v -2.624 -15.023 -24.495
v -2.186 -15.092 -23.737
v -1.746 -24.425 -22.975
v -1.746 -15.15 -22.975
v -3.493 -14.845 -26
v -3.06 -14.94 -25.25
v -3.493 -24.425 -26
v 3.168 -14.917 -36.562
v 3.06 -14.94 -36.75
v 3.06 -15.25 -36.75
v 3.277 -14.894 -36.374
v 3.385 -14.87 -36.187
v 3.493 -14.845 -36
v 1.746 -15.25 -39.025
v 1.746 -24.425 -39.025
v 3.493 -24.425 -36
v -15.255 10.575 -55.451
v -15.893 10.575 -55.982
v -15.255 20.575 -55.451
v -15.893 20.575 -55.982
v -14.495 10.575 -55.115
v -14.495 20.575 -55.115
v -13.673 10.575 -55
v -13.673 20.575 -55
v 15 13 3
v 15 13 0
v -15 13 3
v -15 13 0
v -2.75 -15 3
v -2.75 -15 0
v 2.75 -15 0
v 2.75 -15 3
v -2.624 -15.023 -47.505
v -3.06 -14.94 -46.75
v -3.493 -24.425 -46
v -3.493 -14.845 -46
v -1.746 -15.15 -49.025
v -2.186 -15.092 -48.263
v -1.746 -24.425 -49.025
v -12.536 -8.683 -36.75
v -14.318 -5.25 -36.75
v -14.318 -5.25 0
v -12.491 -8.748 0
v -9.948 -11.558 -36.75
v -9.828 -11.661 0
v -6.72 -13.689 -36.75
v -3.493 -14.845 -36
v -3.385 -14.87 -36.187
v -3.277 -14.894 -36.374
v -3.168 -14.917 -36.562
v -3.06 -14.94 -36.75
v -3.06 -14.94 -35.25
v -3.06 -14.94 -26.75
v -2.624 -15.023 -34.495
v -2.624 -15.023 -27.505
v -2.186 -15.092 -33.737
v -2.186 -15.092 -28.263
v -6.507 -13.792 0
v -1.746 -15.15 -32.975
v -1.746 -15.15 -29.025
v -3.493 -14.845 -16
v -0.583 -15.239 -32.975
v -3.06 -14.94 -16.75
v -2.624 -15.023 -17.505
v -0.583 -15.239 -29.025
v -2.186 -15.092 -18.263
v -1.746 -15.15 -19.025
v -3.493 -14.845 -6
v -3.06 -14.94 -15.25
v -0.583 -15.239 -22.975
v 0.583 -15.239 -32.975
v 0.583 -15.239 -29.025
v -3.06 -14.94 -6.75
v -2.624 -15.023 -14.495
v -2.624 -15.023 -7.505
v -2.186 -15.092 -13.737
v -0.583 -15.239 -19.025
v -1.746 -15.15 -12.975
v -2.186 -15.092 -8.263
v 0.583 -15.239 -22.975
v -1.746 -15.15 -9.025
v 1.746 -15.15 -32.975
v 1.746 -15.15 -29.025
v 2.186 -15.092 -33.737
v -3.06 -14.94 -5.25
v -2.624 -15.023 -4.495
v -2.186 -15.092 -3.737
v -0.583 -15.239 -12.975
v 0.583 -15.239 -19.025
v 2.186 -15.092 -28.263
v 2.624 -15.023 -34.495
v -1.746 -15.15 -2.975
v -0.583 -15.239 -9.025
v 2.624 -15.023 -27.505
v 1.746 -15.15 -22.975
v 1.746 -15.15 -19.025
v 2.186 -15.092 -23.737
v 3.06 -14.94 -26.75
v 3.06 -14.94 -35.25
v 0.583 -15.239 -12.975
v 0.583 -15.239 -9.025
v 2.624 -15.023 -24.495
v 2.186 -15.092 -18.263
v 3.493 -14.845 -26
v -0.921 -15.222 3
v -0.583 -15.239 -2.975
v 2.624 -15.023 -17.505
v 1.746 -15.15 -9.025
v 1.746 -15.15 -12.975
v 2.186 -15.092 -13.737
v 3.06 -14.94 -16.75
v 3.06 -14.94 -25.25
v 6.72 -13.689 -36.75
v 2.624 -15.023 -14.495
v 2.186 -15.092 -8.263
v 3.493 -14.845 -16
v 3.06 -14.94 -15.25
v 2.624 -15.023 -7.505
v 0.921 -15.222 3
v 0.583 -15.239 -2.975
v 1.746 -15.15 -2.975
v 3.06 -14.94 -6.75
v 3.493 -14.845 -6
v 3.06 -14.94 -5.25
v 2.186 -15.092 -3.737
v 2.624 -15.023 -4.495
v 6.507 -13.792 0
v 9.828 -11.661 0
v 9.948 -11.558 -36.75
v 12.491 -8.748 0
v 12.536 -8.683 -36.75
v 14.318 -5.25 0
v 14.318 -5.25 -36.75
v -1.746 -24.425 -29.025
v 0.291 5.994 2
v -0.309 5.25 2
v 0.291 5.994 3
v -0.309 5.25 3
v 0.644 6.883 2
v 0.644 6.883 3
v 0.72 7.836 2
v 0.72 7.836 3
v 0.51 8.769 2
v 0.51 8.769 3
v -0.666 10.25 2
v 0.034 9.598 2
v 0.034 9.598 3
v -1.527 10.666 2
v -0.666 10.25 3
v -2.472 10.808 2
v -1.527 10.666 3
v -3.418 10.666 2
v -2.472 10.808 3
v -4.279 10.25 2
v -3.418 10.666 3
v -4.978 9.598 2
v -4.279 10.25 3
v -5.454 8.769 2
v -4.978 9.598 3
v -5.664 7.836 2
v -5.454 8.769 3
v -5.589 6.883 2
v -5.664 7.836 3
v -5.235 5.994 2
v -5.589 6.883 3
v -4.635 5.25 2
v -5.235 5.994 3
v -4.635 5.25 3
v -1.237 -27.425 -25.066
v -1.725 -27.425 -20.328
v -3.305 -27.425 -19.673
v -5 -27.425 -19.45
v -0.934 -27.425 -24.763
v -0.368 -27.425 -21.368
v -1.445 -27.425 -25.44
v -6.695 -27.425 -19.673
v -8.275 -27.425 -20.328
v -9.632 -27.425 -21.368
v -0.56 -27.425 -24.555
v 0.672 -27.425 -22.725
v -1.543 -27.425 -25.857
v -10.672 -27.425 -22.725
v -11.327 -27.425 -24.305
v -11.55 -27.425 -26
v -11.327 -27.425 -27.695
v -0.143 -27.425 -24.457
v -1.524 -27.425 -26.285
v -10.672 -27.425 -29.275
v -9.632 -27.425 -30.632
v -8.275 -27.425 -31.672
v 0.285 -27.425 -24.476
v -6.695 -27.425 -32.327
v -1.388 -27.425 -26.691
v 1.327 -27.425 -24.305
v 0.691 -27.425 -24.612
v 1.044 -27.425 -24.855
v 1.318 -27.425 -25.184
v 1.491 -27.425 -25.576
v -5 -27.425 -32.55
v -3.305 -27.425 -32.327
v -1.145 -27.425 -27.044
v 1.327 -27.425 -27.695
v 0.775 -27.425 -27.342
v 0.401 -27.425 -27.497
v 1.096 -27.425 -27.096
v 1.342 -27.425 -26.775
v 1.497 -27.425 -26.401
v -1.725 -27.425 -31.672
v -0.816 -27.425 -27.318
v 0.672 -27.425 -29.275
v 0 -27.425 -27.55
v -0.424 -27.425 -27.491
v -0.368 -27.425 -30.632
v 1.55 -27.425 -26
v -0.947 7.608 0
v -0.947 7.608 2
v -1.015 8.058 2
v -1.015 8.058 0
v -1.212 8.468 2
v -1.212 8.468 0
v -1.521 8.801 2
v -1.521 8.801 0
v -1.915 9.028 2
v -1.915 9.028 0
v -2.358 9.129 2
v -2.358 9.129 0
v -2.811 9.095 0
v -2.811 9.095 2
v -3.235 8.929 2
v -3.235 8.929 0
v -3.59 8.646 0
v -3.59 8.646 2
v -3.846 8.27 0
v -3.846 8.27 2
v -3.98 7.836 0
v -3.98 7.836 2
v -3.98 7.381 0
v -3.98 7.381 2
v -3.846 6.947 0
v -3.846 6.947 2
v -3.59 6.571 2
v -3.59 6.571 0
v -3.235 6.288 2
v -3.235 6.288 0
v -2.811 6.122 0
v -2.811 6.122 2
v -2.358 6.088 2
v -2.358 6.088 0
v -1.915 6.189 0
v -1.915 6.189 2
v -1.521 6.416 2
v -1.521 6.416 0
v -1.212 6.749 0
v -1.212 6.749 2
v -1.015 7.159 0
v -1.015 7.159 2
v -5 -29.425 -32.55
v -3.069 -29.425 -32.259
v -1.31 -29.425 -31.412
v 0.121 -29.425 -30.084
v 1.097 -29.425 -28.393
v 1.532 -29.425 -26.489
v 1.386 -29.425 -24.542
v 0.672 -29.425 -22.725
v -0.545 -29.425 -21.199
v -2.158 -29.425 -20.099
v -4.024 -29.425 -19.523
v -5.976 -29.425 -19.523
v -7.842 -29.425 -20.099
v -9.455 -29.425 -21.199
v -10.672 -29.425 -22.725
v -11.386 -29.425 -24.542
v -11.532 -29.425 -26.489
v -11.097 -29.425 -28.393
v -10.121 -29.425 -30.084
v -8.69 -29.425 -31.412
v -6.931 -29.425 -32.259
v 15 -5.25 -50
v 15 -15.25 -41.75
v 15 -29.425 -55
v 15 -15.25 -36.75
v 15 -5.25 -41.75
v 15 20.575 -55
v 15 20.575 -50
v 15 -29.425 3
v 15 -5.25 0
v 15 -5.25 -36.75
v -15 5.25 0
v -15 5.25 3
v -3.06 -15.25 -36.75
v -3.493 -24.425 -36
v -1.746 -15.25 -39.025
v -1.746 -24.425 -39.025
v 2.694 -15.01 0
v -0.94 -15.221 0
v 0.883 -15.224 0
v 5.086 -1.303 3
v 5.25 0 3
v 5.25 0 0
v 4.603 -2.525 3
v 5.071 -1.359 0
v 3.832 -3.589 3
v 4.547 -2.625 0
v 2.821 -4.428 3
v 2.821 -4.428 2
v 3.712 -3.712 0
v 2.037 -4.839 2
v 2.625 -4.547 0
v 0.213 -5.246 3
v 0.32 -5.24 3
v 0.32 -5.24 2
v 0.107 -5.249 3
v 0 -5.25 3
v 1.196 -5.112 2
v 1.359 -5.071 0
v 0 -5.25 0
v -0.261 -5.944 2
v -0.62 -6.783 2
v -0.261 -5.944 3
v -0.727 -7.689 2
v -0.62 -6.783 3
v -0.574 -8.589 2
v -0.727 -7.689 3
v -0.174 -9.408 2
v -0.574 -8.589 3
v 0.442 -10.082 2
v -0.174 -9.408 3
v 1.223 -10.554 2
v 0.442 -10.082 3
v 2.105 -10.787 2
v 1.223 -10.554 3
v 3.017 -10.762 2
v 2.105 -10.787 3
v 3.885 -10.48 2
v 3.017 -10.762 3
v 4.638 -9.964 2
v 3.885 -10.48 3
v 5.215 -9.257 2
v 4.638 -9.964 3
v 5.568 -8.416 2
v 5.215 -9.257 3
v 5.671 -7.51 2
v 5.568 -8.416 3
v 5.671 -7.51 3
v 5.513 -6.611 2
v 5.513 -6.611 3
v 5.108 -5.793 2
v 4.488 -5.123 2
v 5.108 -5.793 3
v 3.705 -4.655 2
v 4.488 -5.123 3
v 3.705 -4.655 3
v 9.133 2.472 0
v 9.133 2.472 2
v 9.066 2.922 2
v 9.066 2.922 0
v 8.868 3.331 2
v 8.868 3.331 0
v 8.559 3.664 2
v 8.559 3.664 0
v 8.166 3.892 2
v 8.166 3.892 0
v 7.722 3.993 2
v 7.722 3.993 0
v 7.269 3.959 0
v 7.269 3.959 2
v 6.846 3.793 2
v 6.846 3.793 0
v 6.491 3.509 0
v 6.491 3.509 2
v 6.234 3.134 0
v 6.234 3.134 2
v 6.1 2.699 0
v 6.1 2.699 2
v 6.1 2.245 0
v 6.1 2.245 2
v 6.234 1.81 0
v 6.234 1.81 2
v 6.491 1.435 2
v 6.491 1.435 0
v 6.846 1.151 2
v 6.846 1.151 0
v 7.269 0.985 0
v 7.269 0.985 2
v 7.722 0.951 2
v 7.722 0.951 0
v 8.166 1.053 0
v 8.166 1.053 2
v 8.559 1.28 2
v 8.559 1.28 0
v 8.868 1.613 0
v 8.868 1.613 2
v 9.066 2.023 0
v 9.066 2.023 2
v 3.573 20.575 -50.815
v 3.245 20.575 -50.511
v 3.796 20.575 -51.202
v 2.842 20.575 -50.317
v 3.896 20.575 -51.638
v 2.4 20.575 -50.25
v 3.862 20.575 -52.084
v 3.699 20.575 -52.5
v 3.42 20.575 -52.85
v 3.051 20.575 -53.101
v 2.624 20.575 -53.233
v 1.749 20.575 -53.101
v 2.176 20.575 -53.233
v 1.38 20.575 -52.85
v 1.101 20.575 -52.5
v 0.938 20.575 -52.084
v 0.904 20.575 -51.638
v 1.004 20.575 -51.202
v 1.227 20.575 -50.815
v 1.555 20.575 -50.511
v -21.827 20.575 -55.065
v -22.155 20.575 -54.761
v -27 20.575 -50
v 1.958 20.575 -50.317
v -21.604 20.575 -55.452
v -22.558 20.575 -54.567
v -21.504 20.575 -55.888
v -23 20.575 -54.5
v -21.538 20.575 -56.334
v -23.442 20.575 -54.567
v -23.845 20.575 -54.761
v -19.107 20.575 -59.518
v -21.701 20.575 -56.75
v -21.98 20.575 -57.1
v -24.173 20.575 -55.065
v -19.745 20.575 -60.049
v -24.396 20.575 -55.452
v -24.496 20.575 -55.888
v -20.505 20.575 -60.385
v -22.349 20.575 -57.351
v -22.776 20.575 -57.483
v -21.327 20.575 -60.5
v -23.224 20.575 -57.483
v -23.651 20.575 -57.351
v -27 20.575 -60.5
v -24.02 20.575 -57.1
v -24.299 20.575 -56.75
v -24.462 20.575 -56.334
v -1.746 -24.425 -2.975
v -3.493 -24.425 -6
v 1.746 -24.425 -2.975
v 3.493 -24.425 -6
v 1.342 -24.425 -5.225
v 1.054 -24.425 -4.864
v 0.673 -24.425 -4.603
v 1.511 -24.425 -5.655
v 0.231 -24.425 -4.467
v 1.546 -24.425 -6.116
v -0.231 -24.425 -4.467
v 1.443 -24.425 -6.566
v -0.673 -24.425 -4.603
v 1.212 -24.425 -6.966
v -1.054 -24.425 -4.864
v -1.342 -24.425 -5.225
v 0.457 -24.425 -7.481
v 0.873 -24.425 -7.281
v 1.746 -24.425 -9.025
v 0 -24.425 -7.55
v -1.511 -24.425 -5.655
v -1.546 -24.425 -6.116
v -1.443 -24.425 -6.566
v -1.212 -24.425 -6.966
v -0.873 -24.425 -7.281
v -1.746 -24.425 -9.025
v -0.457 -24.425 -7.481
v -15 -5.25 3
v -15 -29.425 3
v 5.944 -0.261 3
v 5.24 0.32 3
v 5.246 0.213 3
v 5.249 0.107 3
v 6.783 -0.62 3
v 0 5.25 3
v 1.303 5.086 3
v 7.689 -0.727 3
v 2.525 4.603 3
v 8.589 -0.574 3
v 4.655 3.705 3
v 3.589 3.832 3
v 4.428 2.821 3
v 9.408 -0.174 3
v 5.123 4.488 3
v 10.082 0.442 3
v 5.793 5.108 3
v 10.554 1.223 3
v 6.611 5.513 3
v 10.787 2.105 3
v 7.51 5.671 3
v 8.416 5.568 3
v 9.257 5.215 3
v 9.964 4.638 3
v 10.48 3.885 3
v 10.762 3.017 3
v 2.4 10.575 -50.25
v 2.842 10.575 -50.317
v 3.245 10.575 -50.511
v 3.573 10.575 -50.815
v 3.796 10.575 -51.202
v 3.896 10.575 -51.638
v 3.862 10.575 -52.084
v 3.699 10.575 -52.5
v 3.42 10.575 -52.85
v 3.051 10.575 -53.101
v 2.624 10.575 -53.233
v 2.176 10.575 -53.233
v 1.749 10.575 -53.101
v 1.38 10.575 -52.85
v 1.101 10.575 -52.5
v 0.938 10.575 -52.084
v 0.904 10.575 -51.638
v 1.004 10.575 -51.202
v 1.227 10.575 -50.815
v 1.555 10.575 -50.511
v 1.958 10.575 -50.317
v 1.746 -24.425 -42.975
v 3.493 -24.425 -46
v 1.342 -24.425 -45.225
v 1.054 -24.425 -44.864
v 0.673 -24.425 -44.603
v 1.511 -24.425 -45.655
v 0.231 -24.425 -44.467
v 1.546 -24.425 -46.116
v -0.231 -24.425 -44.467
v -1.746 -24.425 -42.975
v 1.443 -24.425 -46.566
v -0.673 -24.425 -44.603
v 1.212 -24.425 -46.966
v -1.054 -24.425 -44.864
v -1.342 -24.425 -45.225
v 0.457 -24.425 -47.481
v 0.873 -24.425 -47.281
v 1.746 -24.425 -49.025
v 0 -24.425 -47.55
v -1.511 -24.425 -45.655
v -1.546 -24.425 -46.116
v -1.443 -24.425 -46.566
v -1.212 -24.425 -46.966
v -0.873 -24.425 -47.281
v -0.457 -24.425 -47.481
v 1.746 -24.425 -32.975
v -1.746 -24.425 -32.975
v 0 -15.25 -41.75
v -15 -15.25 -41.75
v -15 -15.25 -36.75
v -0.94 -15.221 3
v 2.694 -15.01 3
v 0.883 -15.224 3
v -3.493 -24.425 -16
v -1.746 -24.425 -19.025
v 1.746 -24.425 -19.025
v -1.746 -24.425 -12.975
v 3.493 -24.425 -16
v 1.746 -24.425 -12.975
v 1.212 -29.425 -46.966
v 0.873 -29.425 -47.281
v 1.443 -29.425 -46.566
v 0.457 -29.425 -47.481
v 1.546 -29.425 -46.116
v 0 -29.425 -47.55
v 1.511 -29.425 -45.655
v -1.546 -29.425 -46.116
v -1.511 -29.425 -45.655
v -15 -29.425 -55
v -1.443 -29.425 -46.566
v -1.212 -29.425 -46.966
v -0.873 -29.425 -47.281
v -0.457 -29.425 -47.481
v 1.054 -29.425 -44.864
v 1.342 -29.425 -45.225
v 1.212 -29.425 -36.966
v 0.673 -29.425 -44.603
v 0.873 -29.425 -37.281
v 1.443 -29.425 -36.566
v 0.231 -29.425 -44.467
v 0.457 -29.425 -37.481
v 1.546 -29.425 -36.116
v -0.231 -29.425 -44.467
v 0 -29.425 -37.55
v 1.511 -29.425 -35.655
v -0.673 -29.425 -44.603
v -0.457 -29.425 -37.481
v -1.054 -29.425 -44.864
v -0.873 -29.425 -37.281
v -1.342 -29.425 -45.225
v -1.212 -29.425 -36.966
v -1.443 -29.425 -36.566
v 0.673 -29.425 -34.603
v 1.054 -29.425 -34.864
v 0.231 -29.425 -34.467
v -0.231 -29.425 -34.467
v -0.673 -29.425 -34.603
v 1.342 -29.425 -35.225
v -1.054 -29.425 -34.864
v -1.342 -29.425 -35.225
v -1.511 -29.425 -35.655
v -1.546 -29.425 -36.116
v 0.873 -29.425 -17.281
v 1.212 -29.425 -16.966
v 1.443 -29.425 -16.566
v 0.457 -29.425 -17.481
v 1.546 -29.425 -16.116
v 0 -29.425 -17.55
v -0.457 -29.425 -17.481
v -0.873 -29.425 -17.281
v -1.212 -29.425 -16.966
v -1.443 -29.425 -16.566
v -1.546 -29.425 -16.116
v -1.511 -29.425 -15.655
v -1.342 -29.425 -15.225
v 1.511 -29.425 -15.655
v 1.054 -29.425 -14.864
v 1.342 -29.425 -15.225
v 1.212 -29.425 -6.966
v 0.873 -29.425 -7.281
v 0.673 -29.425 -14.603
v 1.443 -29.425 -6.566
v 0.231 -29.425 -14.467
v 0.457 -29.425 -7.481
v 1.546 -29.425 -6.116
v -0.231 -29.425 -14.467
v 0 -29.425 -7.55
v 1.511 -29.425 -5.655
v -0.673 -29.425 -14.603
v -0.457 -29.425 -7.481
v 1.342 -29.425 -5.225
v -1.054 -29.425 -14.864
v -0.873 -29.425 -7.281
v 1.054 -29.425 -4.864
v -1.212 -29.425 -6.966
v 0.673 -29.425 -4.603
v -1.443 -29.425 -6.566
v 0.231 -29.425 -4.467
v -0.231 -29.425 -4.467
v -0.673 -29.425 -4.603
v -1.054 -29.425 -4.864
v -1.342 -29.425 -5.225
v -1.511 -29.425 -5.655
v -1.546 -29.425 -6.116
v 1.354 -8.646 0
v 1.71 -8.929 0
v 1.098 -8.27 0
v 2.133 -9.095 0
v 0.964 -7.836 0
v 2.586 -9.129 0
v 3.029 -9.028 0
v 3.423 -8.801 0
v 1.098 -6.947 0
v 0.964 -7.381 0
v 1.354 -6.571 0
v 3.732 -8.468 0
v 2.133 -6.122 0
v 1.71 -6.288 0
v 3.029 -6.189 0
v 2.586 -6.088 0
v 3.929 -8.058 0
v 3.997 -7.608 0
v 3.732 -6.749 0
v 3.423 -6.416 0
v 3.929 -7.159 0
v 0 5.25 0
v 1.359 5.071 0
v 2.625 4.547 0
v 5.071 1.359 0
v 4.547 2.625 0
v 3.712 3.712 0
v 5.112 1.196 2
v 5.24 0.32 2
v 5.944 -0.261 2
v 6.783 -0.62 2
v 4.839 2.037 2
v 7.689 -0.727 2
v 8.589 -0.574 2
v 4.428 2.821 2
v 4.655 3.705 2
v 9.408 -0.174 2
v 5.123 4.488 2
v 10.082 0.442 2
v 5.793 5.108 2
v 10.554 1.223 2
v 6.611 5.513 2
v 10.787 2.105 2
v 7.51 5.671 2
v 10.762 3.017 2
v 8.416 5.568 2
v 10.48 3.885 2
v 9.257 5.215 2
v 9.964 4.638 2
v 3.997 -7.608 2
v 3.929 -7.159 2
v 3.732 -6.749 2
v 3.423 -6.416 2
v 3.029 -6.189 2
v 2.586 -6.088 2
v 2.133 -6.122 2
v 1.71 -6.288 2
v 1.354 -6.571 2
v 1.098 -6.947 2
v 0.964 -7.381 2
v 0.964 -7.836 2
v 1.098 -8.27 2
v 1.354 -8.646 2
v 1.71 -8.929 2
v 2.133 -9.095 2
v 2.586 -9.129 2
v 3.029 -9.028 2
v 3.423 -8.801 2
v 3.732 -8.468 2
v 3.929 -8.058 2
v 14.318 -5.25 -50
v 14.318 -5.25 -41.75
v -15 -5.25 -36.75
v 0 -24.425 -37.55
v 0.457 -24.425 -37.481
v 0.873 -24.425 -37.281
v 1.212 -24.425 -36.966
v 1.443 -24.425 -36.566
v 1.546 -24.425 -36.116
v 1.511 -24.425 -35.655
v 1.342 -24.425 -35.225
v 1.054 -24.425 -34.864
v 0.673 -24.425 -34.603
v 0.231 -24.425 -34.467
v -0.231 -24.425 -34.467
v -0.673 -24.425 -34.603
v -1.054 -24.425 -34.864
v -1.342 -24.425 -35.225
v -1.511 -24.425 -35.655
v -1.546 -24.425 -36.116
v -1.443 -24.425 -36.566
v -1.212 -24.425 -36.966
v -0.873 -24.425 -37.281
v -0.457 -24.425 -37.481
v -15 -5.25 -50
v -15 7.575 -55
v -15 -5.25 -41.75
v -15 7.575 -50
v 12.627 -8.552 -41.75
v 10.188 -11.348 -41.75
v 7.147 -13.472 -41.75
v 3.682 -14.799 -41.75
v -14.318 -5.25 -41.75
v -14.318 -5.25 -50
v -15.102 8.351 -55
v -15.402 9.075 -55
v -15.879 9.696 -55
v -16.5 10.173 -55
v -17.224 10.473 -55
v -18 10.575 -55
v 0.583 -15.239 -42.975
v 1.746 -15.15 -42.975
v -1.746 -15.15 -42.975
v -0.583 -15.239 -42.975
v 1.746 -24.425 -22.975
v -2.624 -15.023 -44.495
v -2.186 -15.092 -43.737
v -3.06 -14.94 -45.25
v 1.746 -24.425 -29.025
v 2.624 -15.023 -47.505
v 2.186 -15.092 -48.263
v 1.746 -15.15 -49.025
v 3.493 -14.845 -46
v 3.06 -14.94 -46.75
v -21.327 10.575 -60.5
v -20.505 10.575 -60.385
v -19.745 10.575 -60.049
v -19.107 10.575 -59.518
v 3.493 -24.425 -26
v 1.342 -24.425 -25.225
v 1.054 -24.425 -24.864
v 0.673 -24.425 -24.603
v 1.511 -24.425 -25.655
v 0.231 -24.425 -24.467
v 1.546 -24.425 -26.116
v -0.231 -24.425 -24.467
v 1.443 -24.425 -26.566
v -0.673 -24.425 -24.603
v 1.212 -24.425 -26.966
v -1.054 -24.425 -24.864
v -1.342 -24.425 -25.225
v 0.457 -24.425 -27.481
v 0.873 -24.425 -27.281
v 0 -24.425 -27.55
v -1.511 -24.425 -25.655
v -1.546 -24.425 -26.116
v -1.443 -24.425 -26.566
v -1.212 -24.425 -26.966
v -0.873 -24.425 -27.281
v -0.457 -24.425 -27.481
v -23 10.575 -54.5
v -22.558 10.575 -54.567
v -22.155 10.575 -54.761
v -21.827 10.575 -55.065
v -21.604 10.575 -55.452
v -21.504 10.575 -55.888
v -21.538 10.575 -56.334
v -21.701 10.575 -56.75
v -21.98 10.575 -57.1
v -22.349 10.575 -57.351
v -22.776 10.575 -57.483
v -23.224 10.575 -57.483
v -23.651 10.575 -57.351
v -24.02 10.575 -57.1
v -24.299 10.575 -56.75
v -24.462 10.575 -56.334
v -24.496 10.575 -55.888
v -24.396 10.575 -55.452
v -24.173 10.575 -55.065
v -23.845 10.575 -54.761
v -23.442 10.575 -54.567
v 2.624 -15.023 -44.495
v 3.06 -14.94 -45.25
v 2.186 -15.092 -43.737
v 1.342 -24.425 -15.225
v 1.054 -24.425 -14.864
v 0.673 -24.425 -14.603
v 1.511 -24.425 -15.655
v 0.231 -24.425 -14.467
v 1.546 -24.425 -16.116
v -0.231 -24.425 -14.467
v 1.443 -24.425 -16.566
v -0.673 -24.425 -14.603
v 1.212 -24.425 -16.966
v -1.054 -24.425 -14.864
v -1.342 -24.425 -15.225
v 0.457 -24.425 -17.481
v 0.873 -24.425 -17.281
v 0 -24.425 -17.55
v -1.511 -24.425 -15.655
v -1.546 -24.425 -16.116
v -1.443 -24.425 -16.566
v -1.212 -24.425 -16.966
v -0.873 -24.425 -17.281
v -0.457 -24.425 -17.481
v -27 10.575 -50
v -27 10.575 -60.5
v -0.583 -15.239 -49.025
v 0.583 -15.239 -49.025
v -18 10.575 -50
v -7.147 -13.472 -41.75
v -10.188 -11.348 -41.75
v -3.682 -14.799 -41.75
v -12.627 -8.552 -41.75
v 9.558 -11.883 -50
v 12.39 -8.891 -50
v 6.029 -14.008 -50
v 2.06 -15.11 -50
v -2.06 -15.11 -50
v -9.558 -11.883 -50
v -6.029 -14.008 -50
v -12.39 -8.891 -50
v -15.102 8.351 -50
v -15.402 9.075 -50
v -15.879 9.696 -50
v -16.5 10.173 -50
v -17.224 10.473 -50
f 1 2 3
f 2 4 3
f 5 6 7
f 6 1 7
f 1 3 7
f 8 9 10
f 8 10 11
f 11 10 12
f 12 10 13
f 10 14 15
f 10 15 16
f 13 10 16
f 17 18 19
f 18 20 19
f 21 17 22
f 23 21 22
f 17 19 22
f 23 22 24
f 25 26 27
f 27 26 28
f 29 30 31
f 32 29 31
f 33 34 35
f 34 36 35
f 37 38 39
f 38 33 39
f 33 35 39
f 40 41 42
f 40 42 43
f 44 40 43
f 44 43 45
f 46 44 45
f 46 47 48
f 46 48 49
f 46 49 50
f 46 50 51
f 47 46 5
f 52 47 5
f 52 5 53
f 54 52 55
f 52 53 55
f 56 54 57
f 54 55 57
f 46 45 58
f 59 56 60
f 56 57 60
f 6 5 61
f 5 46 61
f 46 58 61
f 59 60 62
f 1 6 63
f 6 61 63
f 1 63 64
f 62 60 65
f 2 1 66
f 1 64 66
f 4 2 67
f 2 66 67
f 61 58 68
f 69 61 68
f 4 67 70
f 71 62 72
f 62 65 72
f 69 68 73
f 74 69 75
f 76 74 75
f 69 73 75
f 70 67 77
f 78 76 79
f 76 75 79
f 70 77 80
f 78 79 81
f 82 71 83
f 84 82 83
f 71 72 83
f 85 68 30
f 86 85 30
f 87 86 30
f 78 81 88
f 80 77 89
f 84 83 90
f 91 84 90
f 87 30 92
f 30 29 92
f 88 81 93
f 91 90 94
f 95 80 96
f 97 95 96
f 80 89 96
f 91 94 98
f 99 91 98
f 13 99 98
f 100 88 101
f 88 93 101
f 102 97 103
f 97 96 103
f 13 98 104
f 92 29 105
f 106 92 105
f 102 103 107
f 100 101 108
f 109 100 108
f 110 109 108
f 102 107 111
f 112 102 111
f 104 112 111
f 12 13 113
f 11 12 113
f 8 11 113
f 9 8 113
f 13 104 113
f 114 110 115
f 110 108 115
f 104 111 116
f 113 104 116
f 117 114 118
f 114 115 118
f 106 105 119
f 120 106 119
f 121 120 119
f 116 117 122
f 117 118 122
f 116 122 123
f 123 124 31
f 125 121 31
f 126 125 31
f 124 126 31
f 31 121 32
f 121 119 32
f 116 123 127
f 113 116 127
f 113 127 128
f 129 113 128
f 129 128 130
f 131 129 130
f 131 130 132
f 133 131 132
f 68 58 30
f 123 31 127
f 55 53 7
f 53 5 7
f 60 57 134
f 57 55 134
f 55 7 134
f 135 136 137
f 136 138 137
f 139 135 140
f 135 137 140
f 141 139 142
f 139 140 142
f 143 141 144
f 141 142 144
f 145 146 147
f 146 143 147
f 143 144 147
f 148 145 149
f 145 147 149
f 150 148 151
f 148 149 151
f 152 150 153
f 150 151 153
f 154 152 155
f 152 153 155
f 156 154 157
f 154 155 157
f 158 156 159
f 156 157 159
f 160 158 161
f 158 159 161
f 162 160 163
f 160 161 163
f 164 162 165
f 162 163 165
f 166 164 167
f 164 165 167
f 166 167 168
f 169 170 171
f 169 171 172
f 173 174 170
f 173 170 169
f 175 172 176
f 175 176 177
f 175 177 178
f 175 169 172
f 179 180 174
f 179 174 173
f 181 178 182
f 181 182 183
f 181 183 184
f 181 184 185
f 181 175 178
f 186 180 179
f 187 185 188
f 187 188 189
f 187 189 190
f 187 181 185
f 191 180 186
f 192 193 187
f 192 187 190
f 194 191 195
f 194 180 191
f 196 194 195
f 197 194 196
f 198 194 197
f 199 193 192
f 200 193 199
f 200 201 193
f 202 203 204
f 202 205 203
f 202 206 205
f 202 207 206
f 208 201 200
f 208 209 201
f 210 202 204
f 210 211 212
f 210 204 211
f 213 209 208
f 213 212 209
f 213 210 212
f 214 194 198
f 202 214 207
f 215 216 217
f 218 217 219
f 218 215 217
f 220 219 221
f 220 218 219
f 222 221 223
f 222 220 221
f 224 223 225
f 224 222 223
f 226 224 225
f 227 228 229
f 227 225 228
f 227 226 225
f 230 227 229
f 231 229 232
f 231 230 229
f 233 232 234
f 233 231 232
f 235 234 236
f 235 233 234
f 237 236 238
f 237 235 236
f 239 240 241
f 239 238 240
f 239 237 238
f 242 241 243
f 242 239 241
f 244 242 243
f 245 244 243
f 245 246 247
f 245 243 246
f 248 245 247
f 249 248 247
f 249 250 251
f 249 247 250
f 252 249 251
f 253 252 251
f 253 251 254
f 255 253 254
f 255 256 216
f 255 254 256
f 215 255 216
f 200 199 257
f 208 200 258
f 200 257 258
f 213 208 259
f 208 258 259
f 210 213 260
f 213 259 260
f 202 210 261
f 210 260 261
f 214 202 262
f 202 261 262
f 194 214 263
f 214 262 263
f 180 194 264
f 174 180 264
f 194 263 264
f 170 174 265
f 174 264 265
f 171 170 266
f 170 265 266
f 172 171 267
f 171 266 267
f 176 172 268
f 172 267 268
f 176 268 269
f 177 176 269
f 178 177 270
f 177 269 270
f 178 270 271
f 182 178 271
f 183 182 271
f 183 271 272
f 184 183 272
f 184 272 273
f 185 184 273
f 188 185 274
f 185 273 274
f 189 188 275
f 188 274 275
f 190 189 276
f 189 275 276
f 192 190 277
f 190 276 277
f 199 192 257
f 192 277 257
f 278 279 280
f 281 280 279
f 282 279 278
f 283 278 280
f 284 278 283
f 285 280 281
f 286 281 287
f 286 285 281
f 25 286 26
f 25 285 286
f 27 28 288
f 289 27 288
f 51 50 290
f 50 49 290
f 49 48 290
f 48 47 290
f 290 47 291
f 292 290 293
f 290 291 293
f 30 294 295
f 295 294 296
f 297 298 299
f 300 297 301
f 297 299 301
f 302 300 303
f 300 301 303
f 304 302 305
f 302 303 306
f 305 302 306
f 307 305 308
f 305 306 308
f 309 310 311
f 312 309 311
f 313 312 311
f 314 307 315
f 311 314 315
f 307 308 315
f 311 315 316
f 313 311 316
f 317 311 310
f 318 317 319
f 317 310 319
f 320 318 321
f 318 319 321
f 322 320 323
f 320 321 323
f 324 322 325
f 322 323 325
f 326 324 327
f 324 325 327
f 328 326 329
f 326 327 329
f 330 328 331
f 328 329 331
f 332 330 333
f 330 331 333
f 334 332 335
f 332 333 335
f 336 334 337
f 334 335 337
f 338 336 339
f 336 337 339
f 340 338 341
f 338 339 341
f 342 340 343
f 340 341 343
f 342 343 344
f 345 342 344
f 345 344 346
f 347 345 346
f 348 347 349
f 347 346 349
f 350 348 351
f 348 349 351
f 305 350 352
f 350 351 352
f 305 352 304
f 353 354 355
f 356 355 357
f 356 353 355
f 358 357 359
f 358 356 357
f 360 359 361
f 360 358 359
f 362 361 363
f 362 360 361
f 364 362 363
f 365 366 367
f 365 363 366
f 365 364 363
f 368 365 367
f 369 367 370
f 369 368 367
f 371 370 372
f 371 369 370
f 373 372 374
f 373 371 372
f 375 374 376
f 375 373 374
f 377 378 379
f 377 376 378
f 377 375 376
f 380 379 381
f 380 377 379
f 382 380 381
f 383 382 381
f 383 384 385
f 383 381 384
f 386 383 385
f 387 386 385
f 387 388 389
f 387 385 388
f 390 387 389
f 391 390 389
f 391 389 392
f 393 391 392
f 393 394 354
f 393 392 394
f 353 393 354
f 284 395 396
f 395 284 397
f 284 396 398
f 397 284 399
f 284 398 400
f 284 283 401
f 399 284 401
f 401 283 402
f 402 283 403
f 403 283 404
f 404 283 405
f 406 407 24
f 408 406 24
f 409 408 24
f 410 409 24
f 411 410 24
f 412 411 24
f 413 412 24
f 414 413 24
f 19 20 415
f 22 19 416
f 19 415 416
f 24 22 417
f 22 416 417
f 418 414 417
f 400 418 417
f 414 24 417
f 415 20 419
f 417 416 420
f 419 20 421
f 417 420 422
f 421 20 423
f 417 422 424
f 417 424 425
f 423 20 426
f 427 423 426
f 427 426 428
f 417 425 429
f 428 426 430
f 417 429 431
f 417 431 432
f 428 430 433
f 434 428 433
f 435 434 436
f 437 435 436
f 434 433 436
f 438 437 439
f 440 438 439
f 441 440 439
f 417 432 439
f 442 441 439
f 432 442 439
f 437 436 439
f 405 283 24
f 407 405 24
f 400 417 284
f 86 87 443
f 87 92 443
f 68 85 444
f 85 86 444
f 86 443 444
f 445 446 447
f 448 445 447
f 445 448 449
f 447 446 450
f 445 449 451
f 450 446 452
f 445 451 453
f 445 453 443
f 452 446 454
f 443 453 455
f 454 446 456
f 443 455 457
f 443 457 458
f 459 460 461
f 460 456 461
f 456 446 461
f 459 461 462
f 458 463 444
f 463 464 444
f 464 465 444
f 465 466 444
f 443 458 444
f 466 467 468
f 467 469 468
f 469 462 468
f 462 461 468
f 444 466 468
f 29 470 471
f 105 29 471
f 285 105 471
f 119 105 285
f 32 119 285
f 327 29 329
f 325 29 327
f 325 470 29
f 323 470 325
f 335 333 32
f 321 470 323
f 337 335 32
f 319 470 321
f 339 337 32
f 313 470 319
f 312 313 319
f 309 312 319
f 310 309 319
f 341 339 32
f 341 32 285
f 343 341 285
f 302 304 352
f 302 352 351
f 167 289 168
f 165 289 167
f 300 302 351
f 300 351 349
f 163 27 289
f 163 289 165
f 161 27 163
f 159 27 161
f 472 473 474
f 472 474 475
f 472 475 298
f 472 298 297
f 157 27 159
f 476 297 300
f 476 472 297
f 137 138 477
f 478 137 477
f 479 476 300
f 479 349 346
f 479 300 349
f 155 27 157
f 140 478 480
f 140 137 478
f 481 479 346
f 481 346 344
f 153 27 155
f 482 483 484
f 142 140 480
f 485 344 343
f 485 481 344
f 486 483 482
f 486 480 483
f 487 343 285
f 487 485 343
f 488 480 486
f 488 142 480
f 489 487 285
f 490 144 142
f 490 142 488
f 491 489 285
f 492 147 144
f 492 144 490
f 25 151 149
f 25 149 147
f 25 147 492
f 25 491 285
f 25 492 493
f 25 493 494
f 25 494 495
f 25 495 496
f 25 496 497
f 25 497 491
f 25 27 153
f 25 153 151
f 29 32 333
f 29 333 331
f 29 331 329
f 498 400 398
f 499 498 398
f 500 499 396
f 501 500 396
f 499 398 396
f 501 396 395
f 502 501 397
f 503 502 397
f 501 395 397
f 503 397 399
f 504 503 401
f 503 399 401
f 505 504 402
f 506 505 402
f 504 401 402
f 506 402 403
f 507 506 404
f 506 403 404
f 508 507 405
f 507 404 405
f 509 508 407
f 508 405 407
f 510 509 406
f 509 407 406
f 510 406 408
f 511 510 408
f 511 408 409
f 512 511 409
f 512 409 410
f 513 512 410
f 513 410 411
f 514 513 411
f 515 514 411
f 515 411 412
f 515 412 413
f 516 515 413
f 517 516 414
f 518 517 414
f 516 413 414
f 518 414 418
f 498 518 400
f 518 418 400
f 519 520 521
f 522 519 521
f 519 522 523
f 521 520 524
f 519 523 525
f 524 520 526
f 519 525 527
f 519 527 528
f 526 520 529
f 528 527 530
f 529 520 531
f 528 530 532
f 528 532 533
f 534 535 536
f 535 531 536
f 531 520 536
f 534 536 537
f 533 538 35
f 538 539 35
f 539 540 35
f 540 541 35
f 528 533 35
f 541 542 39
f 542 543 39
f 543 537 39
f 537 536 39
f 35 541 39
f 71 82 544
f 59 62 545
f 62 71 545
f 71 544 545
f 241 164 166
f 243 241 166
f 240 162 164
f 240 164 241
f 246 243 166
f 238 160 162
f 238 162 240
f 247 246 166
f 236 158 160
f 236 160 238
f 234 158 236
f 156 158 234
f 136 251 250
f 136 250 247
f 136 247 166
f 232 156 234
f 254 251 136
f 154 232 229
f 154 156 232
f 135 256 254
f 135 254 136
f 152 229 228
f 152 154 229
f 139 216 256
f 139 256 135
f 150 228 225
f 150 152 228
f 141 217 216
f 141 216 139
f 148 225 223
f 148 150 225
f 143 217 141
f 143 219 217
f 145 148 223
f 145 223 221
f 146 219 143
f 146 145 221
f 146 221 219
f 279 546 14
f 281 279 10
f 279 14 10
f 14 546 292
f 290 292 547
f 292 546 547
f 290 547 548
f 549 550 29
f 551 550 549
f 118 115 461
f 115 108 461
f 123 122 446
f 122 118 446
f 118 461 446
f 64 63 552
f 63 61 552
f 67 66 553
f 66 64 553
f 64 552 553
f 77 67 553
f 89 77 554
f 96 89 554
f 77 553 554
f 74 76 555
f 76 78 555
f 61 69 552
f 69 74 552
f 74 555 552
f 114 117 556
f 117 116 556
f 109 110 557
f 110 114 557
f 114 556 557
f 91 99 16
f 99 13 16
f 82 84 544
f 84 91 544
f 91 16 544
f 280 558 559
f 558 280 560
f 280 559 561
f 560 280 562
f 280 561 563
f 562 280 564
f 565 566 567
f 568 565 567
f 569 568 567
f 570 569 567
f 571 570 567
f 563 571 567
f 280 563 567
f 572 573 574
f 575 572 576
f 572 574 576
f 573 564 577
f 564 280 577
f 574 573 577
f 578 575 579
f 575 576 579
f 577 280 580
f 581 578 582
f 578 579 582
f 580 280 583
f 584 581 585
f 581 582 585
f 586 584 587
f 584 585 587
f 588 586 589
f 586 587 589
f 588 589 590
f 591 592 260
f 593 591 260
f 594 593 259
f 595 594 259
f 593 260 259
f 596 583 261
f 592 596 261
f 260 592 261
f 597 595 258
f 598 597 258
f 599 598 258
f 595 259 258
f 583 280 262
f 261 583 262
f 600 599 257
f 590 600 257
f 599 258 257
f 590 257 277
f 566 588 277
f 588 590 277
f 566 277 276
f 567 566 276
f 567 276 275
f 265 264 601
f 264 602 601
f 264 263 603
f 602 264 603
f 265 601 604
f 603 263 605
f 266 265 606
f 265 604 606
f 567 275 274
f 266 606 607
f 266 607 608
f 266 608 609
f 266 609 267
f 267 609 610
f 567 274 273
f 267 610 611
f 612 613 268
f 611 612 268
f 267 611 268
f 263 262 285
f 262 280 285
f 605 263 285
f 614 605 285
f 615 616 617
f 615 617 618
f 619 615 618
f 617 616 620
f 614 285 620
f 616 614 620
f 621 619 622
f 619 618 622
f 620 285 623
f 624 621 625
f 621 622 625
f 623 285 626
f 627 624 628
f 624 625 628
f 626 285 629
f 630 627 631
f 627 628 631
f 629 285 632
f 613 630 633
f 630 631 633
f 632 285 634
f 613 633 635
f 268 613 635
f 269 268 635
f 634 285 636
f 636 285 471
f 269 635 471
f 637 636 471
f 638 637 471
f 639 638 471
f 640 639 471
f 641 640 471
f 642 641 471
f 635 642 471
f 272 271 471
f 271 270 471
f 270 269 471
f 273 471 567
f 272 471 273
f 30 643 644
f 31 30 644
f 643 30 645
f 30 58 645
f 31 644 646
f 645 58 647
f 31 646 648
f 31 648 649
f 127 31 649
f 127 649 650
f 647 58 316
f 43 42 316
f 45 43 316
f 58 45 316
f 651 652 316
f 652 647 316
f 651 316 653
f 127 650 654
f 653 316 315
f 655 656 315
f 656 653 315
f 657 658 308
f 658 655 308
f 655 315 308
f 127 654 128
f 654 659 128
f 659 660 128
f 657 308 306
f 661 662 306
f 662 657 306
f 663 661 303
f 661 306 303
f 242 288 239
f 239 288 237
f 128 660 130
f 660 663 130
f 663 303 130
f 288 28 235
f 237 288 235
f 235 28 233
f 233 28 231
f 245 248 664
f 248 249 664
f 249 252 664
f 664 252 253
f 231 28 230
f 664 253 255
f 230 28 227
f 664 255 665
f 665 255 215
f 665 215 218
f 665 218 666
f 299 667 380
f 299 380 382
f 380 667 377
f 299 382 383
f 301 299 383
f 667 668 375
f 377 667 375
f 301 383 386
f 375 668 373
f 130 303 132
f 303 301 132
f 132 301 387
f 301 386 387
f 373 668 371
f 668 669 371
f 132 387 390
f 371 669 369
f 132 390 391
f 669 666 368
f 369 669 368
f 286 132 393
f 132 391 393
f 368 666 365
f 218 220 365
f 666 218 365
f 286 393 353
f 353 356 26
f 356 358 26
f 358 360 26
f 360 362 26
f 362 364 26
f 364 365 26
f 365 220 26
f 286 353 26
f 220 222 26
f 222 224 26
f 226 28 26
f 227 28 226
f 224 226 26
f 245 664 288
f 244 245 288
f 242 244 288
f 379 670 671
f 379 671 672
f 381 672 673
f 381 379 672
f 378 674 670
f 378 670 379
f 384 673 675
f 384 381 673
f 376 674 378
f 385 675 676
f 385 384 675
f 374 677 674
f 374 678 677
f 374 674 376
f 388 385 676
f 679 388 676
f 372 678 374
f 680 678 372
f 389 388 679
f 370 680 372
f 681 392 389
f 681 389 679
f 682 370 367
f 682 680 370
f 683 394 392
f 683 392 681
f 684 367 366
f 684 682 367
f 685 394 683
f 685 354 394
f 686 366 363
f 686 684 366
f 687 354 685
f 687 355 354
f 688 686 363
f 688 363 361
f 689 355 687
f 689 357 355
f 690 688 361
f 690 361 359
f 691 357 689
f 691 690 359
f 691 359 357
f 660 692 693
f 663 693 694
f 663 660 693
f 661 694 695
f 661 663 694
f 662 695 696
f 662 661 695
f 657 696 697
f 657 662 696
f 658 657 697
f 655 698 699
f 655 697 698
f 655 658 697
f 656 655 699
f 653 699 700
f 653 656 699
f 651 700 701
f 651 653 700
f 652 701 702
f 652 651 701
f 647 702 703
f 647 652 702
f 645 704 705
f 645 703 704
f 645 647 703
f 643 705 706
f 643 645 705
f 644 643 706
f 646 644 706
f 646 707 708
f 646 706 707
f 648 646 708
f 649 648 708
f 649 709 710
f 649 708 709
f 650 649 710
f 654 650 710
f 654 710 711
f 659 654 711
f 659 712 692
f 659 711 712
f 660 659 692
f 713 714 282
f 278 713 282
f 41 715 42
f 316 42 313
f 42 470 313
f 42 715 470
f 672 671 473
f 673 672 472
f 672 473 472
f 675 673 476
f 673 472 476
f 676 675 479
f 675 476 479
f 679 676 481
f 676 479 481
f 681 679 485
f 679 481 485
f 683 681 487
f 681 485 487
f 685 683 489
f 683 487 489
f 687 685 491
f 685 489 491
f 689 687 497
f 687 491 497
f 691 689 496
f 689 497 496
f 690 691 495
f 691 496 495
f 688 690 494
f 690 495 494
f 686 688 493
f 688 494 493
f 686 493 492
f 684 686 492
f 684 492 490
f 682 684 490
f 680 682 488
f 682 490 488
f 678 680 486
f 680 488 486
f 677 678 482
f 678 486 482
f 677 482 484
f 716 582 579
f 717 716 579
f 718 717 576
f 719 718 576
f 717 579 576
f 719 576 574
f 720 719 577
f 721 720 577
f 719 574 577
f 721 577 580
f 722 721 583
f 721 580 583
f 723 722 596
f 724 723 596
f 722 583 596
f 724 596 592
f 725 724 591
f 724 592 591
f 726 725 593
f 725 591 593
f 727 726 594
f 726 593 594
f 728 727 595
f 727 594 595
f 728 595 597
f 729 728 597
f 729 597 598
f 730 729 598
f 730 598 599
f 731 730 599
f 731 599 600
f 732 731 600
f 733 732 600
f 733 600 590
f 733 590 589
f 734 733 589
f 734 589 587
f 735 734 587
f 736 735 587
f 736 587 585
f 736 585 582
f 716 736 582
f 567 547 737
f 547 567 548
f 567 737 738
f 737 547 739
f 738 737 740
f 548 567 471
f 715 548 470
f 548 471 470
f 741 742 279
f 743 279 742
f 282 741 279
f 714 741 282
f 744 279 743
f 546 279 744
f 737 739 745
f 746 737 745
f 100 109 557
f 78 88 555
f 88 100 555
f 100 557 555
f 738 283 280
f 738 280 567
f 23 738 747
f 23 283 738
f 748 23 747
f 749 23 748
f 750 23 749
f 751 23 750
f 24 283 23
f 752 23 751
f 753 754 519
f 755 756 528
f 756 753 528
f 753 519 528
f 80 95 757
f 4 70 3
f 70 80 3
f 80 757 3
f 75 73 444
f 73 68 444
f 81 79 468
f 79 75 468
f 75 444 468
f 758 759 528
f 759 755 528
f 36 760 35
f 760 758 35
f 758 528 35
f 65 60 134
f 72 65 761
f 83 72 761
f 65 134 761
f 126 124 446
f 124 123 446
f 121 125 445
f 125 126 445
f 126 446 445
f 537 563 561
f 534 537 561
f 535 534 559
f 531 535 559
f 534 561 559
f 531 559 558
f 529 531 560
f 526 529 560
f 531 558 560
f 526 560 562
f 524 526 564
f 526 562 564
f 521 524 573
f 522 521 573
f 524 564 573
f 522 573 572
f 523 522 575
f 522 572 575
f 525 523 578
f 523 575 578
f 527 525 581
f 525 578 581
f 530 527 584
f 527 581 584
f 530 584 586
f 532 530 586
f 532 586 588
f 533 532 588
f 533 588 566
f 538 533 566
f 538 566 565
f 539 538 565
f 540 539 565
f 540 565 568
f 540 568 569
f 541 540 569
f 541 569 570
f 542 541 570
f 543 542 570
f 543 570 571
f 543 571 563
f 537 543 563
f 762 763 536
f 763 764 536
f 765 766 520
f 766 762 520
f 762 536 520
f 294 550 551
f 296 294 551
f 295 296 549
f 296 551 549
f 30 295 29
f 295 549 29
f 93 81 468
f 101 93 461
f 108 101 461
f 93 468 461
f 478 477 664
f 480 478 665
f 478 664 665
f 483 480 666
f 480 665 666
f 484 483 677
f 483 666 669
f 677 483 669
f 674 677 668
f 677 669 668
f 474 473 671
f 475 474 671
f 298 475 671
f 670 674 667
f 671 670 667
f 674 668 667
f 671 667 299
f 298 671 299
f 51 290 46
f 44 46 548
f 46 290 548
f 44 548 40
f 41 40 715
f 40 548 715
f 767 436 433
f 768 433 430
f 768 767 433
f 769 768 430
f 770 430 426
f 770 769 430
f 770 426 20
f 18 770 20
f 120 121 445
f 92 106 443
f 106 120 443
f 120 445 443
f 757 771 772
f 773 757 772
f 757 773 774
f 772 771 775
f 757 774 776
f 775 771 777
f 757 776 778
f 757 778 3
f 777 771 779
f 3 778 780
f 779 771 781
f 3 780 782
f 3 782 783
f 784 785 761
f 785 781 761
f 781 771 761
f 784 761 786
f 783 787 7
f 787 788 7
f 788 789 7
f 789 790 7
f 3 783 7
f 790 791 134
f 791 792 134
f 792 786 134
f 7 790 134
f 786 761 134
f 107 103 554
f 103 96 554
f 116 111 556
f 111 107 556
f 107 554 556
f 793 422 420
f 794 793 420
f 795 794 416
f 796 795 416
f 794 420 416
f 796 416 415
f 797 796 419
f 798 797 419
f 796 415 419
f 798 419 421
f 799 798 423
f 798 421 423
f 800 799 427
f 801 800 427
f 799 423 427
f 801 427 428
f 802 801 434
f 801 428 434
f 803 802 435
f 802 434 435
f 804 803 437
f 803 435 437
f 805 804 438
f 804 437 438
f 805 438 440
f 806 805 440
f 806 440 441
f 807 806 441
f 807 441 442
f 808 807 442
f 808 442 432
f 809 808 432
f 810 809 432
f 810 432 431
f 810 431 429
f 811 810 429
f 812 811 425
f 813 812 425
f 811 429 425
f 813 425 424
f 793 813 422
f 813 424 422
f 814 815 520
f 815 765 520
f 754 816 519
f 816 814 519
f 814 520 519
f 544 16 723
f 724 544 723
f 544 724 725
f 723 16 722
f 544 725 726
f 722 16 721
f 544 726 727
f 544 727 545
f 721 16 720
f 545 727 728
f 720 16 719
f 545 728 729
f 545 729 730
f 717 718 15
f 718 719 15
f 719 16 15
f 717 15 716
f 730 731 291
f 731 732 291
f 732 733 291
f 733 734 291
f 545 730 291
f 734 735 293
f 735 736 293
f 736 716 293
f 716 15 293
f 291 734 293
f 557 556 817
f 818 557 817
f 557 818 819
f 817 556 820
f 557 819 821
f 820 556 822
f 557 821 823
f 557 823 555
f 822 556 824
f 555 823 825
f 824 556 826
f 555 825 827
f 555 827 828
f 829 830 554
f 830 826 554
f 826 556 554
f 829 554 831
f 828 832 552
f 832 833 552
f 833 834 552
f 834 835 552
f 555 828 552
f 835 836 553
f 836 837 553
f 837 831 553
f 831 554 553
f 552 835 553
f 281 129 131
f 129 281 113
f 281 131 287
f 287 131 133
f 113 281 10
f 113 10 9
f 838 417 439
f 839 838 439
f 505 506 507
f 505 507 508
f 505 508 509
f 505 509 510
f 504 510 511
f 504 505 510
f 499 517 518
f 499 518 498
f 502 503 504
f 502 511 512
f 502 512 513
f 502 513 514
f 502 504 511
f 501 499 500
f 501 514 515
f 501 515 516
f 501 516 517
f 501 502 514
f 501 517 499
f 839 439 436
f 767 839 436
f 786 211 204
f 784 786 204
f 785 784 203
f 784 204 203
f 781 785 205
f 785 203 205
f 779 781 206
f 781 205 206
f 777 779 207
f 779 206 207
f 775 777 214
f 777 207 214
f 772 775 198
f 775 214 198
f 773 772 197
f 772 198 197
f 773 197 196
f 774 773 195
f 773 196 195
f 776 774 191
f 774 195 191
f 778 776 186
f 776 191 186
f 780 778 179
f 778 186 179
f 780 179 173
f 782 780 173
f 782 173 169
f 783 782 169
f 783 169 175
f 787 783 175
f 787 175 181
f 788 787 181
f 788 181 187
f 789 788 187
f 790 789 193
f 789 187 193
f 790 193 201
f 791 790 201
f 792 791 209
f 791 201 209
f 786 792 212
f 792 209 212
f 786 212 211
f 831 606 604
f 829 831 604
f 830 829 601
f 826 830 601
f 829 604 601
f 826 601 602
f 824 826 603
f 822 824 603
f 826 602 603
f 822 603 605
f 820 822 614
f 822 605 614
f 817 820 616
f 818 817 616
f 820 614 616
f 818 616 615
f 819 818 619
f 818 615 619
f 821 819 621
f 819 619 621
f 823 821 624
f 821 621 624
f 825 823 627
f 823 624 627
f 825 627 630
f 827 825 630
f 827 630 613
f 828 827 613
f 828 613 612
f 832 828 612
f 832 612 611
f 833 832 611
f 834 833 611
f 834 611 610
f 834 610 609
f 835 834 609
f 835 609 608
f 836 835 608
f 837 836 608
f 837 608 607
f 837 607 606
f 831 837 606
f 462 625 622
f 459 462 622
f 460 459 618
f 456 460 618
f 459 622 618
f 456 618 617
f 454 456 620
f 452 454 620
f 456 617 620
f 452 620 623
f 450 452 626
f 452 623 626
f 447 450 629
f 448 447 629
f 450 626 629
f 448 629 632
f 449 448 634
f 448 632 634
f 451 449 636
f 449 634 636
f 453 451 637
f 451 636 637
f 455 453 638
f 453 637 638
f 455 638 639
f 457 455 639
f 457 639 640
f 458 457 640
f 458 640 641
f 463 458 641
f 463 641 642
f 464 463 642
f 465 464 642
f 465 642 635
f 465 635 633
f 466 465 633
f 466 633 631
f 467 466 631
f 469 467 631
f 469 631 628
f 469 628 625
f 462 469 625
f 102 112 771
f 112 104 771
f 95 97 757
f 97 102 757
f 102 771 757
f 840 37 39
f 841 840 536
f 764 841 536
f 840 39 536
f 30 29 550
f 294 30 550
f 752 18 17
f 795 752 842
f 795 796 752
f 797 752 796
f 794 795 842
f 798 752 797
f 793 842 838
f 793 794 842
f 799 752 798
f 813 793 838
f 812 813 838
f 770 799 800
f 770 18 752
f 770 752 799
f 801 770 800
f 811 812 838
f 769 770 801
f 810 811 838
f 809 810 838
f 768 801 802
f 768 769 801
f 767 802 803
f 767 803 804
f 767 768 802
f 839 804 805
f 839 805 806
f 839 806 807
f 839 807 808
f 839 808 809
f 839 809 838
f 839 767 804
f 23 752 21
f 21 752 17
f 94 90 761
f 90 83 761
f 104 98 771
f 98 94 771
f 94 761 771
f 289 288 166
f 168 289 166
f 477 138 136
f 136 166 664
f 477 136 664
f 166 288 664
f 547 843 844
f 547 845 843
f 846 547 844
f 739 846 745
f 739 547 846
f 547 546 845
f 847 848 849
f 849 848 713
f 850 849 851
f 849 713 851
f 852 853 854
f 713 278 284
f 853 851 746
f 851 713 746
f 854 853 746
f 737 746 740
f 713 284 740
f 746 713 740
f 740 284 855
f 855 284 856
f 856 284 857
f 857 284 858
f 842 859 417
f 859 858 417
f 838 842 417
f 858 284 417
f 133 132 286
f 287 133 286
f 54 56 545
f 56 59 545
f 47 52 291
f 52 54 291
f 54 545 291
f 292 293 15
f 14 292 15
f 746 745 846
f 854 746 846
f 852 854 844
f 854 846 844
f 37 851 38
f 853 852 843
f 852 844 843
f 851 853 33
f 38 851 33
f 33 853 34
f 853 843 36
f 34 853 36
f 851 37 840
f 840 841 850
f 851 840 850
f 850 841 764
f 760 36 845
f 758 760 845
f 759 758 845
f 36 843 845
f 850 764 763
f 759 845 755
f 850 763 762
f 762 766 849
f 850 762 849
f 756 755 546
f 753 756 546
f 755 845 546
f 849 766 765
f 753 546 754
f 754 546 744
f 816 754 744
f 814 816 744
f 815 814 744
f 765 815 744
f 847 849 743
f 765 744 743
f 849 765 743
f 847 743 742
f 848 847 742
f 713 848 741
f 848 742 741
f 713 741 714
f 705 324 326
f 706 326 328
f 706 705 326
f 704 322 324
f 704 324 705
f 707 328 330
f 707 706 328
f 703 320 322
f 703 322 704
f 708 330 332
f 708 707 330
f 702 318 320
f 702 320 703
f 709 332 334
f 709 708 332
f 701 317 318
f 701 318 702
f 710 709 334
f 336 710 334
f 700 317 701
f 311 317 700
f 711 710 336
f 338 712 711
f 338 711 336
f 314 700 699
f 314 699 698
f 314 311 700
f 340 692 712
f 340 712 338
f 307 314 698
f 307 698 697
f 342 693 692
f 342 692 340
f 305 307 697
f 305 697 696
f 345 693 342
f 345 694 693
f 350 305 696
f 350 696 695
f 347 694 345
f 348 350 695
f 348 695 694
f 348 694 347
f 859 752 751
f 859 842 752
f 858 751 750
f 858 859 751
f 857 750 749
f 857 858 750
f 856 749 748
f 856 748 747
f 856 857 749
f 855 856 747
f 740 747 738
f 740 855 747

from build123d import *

# Parameters (mm, degrees)
SKETCH1_R           = 1.525
BOSS_EXTRUDE1_DEPTH = 3
BOSS_EXTRUDE2_DEPTH = 53
SKETCH3_R           = 1.55
CUT_EXTRUDE1_DEPTH  = 68.267232922
BOSS_EXTRUDE3_DEPTH = 3
CUT_EXTRUDE2_START  = -5
SKETCH5_R           = 1.55
CUT_EXTRUDE2_DEPTH  = 63.267232996
SKETCH6_R           = 3.2
CUT_EXTRUDE3_DEPTH  = 1
SKETCH7_W           = 30
SKETCH7_H           = 50
BOSS_EXTRUDE4_DEPTH = 5
SKETCH9_W           = 5
SKETCH9_H           = 20
CUT_EXTRUDE6_DEPTH  = 70.215826406
SKETCH10_R          = 6.55
CUT_EXTRUDE7_DEPTH  = 2
SKETCH11_R          = 1.5
BOSS_EXTRUDE5_DEPTH = 10
SKETCH12_R          = 1.5
CUT_EXTRUDE8_DEPTH  = 10
FILLET1_R           = 3
FILLET2_R           = 3


with BuildPart() as part:
    # Sketch1 → Boss-Extrude1 (new body)
    with BuildSketch(Plane.XY):
        with BuildLine():
            Line((-15, -15), (15, -15))
            Line((15, -15), (15, 13))
            Line((15, 13), (-15, 13))
            Line((-15, 13), (-15, 5.25))
            Line((-15, 5.25), (0, 5.25))
            ThreePointArc((0, 5.25), (3.712310601, 3.712310601), (5.25, 0))
            ThreePointArc((5.25, 0), (3.712310601, -3.712310601), (0, -5.25))
            Line((0, -5.25), (-15, -5.25))
            Line((-15, -5.25), (-15, -15))
        make_face()
        with Locations((-2.472135955, 7.60845213)):
            Circle(SKETCH1_R, mode=Mode.SUBTRACT)
        with Locations((7.60845213, 2.472135955)):
            Circle(SKETCH1_R, mode=Mode.SUBTRACT)
        with Locations((2.472135955, -7.60845213)):
            Circle(SKETCH1_R, mode=Mode.SUBTRACT)
    extrude(amount=BOSS_EXTRUDE1_DEPTH)

    # Sketch2 → Boss-Extrude2 (add)
    with BuildSketch(Plane.XY.offset(3)):
        with BuildLine():
            Line((-15, -15), (-15, -5.25))
            Line((-15, -5.25), (-14.317821063, -5.25))
            ThreePointArc((-14.317821063, -5.25), (0, -15.25), (14.317821063, -5.25))
            Line((14.317821063, -5.25), (15, -5.25))
            Line((15, -5.25), (15, -15))
            Line((15, -15), (15, -29.425))
            Line((15, -29.425), (-15, -29.425))
            Line((-15, -29.425), (-15, -15))
        make_face()
    extrude(amount=-BOSS_EXTRUDE2_DEPTH)

    # Sketch3 → Cut-Extrude1 (cut, through all)
    with BuildSketch(Plane(origin=(0, -29.425, 0), x_dir=(-1, 0, 0), z_dir=(0, -1, 0))):
        with Locations(Location((0, 46, 0), (0, 0, 90))):
            Circle(SKETCH3_R)
        with Locations(Location((0, 36, 0), (0, 0, 90))):
            Circle(SKETCH3_R)
        with Locations(Location((0, 26, 0), (0, 0, 90))):
            Circle(SKETCH3_R)
        with Locations(Location((0, 16, 0), (0, 0, 90))):
            Circle(SKETCH3_R)
        with Locations(Location((0, 6, 0), (0, 0, 90))):
            Circle(SKETCH3_R)
    extrude(amount=-CUT_EXTRUDE1_DEPTH, mode=Mode.SUBTRACT)

    # Sketch5 → Cut-Extrude2 (cut, through all)
    # profile 1 of 5: a face of its own
    with BuildSketch(Plane(origin=(0, -29.425, 0), x_dir=(-1, 0, 0), z_dir=(0, -1, 0)).offset(CUT_EXTRUDE2_START)):
        Polygon((1.746484564, 32.975), (3.492969129, 36), (1.746484564, 39.025), (-1.746484564, 39.025), (-3.492969129, 36), (-1.746484564, 32.975), align=None)
        with Locations(Location((0, 36, 0), (0, 0, 90))):
            Circle(SKETCH5_R, mode=Mode.SUBTRACT)
    # profile 2 of 5: a face of its own
    with BuildSketch(Plane(origin=(0, -29.425, 0), x_dir=(-1, 0, 0), z_dir=(0, -1, 0)).offset(CUT_EXTRUDE2_START)):
        Polygon((1.746484564, 42.975), (3.492969129, 46), (1.746484564, 49.025), (-1.746484564, 49.025), (-3.492969129, 46), (-1.746484564, 42.975), align=None)
        with Locations(Location((0, 46, 0), (0, 0, 90))):
            Circle(SKETCH5_R, mode=Mode.SUBTRACT)
    # profile 3 of 5: a face of its own
    with BuildSketch(Plane(origin=(0, -29.425, 0), x_dir=(-1, 0, 0), z_dir=(0, -1, 0)).offset(CUT_EXTRUDE2_START)):
        Polygon((1.746484564, 22.975), (3.492969129, 26), (1.746484564, 29.025), (-1.746484564, 29.025), (-3.492969129, 26), (-1.746484564, 22.975), align=None)
        with Locations(Location((0, 26, 0), (0, 0, 90))):
            Circle(SKETCH5_R, mode=Mode.SUBTRACT)
    # profile 4 of 5: a face of its own
    with BuildSketch(Plane(origin=(0, -29.425, 0), x_dir=(-1, 0, 0), z_dir=(0, -1, 0)).offset(CUT_EXTRUDE2_START)):
        Polygon((1.746484564, 12.975), (3.492969129, 16), (1.746484564, 19.025), (-1.746484564, 19.025), (-3.492969129, 16), (-1.746484564, 12.975), align=None)
        with Locations(Location((0, 16, 0), (0, 0, 90))):
            Circle(SKETCH5_R, mode=Mode.SUBTRACT)
    # profile 5 of 5: a face of its own
    with BuildSketch(Plane(origin=(0, -29.425, 0), x_dir=(-1, 0, 0), z_dir=(0, -1, 0)).offset(CUT_EXTRUDE2_START)):
        Polygon((1.746484564, 2.975), (3.492969129, 6), (1.746484564, 9.025), (-1.746484564, 9.025), (-3.492969129, 6), (-1.746484564, 2.975), align=None)
        with Locations(Location((0, 6, 0), (0, 0, 90))):
            Circle(SKETCH5_R, mode=Mode.SUBTRACT)
    extrude(amount=-CUT_EXTRUDE2_DEPTH, mode=Mode.SUBTRACT)

    # Sketch6 → Cut-Extrude3 (cut)
    with BuildSketch(Plane.XY.offset(3)):
        with Locations((2.472135955, -7.60845213)):
            Circle(SKETCH6_R)
        with Locations((-2.472135955, 7.60845213)):
            Circle(SKETCH6_R)
        with Locations((7.60845213, 2.472135955)):
            Circle(SKETCH6_R)
    extrude(amount=-CUT_EXTRUDE3_DEPTH, mode=Mode.SUBTRACT)

    # Sketch7 → Boss-Extrude4 (add)
    with BuildSketch(Plane(origin=(0, 0, -50), x_dir=(-1, 0, 0), z_dir=(0, 0, -1))):
        with Locations((0, -4.425)):
            Rectangle(SKETCH7_W, SKETCH7_H)
    extrude(amount=BOSS_EXTRUDE4_DEPTH)

    # Sketch9 → Cut-Extrude6 (cut, through all)
    with BuildSketch(Plane.ZY.offset(15)):
        with Locations((-39.25, -5.25)):
            Rectangle(SKETCH9_W, SKETCH9_H)
    extrude(amount=-CUT_EXTRUDE6_DEPTH, mode=Mode.SUBTRACT)

    # Sketch10 → Cut-Extrude7 (cut)
    with BuildSketch(Plane(origin=(0, -29.425, 0), x_dir=(-1, 0, 0), z_dir=(0, -1, 0))):
        with Locations(Location((5, 26, 0), (0, 0, 90))):
            Circle(SKETCH10_R)
    extrude(amount=-CUT_EXTRUDE7_DEPTH, mode=Mode.SUBTRACT)

    # Sketch11 → Boss-Extrude5 (add)
    with BuildSketch(Plane(origin=(0, 20.575, 0), x_dir=(1, 0, 0), z_dir=(0, 1, 0))):
        Polygon((-15, 50), (-27, 50), (-27, 60.5), (-20, 60.5), (-15, 55), align=None)
        with Locations(Location((-23, 56, 0), (0, 0, 270))):
            Circle(SKETCH11_R, mode=Mode.SUBTRACT)
    extrude(amount=-BOSS_EXTRUDE5_DEPTH)

    # Sketch12 → Cut-Extrude8 (cut)
    with BuildSketch(Plane(origin=(0, 20.575, 0), x_dir=(1, 0, 0), z_dir=(0, 1, 0))):
        with Locations(Location((2.4, 51.75, 0), (0, 0, 270))):
            Circle(SKETCH12_R)
    extrude(amount=-CUT_EXTRUDE8_DEPTH, mode=Mode.SUBTRACT)

    # Fillet1
    fillet1_edges = [part.edges().sort_by_distance(p)[0] for p in [
        (-20, 15.575, -60.5),
        (-15, 15.575, -55),
    ]]
    fillet(fillet1_edges, radius=FILLET1_R)

    # Fillet2
    fillet2_edges = [part.edges().sort_by_distance(p)[0] for p in [
        (-15, 10.575, -52.5),
    ]]
    fillet(fillet2_edges, radius=FILLET2_R)


with BuildPart() as body_2:
    # Sketch4 → Boss-Extrude3 (new body)
    with BuildSketch(Plane.XY.offset(3)):
        with BuildLine():
            Line((-2.75, -15), (2.693973064, -15.010163528))
            ThreePointArc((2.693973064, -15.010163528), (-0.028470664, -15.249973424), (-2.75, -15))
        make_face()
    extrude(amount=-BOSS_EXTRUDE3_DEPTH)


solid = Compound([part.part, body_2.part])
